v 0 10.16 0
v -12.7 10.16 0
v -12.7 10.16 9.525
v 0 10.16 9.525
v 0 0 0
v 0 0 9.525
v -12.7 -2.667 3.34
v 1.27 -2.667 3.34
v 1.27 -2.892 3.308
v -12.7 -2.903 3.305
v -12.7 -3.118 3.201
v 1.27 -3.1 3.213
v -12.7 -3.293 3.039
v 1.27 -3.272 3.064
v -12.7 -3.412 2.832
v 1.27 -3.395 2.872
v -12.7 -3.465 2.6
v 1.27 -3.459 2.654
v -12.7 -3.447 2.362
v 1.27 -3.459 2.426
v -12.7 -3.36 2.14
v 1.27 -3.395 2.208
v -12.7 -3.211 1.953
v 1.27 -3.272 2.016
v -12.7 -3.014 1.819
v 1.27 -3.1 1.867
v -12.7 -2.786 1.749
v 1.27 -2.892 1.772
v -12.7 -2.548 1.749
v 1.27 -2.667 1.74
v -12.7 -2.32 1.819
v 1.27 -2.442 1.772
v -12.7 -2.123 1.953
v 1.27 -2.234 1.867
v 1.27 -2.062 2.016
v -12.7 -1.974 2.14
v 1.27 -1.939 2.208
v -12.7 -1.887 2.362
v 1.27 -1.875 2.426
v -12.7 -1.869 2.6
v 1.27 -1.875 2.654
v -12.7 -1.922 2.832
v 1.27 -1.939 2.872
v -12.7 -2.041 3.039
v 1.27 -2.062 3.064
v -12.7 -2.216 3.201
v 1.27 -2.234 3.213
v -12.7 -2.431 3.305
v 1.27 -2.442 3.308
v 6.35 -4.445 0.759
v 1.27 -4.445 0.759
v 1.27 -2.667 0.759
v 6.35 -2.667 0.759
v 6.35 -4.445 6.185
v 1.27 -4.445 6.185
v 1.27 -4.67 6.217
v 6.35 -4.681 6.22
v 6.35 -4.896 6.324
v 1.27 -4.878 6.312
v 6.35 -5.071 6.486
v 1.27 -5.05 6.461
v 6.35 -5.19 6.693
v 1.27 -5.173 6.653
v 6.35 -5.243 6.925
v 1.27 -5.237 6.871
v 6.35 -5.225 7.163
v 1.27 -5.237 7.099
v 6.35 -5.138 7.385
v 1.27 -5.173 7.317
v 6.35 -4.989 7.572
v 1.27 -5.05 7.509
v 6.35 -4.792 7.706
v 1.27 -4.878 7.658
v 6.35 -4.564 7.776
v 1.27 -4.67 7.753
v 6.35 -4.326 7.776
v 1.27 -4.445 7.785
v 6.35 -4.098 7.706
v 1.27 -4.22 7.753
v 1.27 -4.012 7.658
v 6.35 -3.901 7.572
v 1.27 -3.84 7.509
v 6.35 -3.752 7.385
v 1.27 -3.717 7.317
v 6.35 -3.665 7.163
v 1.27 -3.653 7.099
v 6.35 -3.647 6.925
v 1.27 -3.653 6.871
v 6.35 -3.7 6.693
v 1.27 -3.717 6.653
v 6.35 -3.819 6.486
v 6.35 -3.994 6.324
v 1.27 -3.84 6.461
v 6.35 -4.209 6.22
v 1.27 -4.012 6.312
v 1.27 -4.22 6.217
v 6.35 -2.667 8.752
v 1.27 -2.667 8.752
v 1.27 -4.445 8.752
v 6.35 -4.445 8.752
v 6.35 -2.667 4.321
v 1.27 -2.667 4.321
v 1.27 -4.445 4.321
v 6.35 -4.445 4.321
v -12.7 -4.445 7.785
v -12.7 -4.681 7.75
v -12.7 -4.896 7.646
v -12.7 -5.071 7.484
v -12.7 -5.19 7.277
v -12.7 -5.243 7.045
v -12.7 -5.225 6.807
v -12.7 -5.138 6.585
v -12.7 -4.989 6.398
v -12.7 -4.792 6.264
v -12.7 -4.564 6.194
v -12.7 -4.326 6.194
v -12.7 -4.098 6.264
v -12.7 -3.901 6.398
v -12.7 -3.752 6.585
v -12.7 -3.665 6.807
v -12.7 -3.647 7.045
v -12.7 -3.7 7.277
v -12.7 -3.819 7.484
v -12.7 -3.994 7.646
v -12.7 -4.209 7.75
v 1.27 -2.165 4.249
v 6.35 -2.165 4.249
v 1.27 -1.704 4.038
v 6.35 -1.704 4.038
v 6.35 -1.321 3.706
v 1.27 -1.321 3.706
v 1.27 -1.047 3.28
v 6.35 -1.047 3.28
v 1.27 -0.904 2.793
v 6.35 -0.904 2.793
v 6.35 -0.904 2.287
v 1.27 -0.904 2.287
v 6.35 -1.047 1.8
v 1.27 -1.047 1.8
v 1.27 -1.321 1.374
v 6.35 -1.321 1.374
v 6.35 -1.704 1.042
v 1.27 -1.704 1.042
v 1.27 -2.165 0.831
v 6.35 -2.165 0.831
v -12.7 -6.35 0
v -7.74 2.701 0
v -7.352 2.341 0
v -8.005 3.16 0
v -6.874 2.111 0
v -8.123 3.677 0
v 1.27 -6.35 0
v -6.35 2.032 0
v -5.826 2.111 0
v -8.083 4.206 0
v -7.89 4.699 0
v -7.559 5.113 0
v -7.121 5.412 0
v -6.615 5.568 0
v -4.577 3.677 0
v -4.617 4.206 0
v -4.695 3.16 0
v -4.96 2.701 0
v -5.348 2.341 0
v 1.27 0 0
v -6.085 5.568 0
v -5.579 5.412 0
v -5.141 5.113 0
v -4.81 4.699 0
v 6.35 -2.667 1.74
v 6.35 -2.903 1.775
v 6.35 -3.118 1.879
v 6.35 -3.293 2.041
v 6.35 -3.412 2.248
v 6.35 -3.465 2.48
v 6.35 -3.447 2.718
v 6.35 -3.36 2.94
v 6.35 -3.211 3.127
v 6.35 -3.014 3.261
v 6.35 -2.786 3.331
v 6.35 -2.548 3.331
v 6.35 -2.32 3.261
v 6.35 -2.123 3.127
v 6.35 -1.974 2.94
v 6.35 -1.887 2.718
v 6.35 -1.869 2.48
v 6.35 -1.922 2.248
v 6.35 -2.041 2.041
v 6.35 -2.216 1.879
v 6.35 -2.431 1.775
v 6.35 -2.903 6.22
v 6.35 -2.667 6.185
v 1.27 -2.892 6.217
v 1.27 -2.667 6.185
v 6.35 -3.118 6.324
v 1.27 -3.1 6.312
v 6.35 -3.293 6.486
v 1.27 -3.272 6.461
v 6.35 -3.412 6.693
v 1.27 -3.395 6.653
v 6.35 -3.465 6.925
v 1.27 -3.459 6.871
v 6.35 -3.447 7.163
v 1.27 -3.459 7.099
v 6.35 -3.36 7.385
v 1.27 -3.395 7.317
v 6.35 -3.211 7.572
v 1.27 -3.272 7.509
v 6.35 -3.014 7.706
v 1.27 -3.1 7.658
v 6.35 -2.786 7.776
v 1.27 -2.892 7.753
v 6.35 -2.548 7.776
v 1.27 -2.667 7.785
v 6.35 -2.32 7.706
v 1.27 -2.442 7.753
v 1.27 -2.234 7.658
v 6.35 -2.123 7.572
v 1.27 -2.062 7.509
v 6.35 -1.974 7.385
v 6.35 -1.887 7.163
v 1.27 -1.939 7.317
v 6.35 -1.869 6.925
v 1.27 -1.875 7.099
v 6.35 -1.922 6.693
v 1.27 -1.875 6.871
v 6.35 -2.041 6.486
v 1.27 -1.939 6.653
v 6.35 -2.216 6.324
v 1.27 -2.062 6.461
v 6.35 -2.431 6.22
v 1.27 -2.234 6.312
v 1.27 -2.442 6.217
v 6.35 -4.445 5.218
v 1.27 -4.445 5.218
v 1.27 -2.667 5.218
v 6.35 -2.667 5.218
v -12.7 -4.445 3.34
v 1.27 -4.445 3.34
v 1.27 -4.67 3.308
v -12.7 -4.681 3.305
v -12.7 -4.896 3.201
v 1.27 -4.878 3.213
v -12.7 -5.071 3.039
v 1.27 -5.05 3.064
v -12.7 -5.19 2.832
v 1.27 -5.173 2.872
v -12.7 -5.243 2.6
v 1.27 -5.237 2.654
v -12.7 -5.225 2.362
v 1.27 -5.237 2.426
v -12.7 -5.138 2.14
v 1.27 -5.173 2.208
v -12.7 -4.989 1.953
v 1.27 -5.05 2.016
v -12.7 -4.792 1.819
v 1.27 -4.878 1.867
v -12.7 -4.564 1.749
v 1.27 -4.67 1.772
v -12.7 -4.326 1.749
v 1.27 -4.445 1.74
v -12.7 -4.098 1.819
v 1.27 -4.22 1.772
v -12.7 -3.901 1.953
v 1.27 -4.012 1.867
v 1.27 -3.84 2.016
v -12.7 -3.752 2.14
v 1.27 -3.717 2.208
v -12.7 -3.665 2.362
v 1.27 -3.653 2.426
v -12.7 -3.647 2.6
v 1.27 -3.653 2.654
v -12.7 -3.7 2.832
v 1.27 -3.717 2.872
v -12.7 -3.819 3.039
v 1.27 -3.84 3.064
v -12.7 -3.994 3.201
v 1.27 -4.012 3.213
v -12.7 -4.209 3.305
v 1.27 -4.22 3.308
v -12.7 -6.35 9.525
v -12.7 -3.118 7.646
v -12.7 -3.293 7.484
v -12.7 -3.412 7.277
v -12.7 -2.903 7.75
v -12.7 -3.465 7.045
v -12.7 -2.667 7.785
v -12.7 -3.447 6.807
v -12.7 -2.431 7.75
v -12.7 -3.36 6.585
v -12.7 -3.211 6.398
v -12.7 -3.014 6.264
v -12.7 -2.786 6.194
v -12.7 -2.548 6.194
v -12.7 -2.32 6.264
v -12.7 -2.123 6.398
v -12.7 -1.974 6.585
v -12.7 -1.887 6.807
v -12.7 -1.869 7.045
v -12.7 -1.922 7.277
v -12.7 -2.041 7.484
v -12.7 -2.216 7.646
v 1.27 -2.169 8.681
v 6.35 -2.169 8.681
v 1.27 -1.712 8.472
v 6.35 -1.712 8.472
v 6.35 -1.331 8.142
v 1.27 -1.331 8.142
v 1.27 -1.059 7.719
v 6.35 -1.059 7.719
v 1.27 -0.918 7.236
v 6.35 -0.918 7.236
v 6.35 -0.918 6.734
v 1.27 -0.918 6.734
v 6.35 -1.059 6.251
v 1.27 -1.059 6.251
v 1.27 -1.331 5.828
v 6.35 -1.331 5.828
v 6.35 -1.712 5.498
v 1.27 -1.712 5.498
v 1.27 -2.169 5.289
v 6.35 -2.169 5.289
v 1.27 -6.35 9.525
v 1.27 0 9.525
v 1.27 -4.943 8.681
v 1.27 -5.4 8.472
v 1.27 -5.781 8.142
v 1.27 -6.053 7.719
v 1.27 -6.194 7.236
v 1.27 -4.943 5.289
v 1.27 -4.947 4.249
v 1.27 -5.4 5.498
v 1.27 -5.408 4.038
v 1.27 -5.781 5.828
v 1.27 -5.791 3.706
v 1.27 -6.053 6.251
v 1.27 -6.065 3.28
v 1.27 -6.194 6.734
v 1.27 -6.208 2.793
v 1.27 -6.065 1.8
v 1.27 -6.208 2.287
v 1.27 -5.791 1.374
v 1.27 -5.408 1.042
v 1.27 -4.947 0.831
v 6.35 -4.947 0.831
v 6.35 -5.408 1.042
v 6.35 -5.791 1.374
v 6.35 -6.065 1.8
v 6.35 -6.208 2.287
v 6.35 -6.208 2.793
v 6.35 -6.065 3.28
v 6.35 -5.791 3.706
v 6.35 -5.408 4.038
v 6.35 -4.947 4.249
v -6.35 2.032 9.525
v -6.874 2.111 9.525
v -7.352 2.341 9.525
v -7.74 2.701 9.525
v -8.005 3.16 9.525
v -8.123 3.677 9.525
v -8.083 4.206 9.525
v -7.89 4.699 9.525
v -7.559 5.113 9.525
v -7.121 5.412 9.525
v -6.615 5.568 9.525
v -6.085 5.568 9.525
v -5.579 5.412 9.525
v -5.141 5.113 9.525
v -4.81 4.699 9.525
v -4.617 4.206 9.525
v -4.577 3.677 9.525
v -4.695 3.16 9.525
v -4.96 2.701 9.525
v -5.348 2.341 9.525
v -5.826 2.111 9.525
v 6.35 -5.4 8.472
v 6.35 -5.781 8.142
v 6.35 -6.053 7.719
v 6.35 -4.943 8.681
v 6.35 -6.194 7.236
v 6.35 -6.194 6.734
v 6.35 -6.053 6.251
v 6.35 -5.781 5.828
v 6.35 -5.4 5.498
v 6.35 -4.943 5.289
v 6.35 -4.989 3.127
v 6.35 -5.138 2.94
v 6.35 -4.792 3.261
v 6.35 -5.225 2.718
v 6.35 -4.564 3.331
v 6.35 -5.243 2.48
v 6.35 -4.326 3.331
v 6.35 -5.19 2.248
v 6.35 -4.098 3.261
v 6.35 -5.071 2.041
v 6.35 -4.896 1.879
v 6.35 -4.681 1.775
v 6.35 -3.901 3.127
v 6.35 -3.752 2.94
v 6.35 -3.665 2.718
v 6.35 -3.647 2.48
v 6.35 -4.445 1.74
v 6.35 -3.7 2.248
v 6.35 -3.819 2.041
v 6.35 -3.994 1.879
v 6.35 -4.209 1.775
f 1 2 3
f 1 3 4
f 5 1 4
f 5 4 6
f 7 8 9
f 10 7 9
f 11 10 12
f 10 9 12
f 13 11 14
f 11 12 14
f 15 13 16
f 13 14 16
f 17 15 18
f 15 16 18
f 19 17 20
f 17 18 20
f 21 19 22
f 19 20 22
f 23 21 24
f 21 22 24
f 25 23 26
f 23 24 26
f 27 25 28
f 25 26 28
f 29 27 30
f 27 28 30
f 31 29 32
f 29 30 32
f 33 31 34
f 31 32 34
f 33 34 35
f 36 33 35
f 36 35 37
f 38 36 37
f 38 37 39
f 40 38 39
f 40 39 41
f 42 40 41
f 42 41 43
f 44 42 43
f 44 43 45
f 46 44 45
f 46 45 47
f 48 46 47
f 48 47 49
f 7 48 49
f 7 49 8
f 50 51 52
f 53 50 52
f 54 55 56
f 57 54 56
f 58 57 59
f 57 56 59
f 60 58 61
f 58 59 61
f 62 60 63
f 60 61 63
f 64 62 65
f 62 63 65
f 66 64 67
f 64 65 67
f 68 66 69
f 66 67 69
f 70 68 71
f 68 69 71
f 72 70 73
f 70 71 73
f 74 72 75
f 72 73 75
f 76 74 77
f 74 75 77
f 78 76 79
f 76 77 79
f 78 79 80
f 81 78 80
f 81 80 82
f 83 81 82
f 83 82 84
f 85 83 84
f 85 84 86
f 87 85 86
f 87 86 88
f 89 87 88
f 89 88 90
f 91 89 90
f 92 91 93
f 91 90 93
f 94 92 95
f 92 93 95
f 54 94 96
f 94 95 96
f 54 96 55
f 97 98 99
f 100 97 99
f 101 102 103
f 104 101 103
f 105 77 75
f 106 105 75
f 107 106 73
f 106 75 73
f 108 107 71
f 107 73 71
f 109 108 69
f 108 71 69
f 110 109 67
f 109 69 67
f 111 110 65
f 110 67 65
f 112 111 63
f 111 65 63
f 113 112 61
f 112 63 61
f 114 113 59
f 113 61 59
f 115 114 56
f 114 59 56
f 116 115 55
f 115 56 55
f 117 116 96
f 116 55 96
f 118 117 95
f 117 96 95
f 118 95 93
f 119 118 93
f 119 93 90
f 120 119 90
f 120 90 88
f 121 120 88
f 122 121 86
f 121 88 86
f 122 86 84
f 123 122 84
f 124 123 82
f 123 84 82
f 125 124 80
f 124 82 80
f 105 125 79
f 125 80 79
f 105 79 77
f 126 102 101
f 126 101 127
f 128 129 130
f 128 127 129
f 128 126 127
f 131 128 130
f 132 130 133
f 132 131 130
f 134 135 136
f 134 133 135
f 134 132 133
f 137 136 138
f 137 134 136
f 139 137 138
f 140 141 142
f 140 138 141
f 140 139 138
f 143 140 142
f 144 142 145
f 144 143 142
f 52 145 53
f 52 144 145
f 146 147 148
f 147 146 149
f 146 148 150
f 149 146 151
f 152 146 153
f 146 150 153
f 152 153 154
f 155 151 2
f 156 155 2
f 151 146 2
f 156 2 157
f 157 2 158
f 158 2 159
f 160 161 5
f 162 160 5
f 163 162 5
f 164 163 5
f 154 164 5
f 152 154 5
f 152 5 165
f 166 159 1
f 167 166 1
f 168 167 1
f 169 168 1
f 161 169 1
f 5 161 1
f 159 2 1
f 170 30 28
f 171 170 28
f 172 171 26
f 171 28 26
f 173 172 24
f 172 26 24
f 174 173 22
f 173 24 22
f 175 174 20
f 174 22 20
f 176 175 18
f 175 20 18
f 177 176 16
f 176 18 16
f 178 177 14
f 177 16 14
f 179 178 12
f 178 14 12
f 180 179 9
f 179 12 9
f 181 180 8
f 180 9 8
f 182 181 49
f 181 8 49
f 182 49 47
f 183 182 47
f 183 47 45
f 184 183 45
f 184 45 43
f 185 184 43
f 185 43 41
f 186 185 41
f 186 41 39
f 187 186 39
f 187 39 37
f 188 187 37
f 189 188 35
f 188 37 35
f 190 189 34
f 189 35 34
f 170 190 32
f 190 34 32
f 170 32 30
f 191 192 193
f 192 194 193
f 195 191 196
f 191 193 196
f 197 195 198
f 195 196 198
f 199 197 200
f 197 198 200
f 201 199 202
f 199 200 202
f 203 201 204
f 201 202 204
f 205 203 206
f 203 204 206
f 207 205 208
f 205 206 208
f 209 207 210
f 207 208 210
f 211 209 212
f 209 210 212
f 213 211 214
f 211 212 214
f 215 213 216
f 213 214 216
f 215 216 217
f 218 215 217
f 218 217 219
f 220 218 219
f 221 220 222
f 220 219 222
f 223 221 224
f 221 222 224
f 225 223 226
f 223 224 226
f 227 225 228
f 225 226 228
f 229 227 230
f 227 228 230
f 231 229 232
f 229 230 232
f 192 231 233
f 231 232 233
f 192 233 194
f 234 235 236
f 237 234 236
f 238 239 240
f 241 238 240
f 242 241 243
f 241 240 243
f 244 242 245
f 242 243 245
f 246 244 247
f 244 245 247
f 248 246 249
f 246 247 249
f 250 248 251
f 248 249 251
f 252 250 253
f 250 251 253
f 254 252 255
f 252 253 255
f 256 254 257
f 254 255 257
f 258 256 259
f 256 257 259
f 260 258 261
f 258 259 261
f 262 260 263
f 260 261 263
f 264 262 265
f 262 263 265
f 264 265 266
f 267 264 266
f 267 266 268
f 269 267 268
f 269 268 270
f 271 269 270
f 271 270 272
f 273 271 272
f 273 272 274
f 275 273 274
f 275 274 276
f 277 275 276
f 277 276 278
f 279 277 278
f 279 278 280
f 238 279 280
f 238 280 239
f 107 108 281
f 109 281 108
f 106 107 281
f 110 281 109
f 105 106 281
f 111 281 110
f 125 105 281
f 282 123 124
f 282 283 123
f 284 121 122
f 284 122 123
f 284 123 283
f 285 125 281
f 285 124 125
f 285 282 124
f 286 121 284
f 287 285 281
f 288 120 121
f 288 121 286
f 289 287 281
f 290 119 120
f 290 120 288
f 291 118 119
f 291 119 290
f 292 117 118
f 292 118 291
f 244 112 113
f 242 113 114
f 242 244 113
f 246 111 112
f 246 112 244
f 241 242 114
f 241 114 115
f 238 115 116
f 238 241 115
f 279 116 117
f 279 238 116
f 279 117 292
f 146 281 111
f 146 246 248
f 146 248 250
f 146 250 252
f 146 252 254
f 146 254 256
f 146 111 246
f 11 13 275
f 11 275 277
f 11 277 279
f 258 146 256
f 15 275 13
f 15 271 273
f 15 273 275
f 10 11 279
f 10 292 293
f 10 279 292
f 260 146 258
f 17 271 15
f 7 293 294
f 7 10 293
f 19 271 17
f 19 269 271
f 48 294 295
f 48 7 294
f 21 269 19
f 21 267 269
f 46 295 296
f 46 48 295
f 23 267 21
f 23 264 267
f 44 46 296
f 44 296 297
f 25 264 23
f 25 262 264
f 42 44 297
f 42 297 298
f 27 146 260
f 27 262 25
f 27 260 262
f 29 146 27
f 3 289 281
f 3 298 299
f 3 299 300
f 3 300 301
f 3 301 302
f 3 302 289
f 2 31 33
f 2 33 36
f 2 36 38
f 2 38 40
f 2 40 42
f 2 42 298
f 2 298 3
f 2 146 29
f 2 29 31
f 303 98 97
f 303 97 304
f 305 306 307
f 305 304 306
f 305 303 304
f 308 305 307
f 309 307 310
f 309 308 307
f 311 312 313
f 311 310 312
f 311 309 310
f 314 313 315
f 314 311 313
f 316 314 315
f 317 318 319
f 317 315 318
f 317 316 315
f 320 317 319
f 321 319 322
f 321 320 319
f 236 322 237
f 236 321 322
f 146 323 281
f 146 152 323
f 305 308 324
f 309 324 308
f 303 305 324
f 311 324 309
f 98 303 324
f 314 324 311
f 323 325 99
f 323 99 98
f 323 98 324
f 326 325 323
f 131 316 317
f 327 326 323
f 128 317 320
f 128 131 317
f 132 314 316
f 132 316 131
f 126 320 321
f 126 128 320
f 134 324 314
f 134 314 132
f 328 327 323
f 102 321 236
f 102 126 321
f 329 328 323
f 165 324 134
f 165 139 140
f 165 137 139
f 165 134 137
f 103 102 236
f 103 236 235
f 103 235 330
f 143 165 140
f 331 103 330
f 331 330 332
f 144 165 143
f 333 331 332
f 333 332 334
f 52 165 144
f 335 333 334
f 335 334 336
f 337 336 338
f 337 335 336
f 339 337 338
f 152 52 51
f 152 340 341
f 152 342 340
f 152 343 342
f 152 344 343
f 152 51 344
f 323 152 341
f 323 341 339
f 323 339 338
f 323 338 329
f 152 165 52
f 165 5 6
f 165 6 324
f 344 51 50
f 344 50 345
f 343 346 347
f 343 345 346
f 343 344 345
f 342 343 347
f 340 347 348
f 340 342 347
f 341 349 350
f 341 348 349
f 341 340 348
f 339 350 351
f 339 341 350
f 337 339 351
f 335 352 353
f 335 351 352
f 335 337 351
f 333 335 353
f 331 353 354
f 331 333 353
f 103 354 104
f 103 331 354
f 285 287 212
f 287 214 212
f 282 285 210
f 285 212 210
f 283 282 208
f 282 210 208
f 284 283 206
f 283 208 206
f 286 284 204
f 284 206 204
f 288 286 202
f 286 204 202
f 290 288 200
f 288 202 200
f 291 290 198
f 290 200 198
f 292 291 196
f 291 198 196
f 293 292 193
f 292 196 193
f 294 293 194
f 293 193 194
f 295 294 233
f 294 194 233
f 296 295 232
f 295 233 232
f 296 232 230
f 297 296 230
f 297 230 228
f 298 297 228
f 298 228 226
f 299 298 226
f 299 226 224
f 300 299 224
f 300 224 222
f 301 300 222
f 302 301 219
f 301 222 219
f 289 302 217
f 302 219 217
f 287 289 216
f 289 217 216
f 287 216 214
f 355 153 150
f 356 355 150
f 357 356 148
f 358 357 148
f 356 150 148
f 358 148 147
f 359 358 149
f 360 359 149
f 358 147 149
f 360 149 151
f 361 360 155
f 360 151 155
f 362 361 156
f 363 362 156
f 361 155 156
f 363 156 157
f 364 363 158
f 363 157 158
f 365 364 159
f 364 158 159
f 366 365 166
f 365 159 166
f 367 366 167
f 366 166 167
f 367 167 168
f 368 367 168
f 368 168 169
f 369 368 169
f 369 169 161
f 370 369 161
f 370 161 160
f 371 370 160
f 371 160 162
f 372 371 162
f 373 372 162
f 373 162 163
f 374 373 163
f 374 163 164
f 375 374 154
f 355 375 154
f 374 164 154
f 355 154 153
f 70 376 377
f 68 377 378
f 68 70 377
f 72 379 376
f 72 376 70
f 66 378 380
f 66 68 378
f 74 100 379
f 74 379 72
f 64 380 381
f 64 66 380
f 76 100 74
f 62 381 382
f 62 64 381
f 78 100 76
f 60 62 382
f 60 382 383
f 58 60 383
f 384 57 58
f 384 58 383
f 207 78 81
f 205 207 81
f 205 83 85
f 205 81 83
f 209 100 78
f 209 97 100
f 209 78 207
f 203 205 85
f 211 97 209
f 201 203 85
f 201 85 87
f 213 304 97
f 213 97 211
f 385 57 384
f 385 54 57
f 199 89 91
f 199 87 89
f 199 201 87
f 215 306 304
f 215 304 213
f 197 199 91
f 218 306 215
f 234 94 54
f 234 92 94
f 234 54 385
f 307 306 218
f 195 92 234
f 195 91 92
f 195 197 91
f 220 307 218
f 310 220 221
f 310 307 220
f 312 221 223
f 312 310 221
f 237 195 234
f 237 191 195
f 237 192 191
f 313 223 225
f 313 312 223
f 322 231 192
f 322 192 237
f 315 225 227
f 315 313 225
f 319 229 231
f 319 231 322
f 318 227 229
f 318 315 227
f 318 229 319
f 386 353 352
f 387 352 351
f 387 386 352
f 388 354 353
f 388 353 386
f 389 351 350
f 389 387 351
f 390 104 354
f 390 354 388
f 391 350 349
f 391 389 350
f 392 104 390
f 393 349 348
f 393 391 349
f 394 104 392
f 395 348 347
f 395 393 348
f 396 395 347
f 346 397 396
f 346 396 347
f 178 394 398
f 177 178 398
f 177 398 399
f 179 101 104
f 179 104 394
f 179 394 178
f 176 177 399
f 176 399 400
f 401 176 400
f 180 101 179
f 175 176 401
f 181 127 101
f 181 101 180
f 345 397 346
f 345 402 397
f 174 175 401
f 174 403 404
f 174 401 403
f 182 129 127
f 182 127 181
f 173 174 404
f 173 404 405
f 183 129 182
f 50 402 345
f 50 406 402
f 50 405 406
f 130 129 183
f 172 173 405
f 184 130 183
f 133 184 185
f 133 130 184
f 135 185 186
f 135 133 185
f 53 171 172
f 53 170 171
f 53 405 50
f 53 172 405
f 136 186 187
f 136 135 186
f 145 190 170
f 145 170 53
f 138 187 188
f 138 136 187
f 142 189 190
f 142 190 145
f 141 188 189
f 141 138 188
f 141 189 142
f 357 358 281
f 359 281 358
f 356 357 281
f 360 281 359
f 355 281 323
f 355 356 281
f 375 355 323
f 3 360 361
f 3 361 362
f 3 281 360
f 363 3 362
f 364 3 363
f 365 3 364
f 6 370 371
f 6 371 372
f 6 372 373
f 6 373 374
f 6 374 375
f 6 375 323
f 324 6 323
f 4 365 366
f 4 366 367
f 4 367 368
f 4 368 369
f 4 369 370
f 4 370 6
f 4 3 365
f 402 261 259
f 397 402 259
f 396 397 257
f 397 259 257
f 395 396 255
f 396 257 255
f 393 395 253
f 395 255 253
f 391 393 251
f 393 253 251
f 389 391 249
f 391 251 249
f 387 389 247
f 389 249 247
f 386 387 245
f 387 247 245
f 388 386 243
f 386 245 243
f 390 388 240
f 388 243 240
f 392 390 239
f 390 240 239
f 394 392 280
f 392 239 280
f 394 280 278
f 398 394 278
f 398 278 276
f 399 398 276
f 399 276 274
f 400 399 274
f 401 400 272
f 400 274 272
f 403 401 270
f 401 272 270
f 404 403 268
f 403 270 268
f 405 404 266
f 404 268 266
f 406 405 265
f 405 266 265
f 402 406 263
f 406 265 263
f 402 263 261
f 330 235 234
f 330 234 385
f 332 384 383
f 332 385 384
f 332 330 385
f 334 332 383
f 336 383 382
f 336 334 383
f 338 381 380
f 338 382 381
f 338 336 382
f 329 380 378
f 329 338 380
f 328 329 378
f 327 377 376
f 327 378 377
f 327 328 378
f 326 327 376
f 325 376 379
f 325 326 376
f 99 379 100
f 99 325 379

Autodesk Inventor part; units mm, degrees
ref_plane "YZ Plane" through (0, 0, 0) normal (1, 0, 0) x (0, 1, 0)
ref_plane "XZ Plane" through (0, 0, 0) normal (0, 1, 0) x (-1, 0, 0)
ref_plane "XY Plane" through (0, 0, 0) normal (0, 0, 1) x (1, 0, 0)
sketch "Sketch1" plane through (0, 0, 0) normal (0, 0, 1) x (1, 0, 0)
  line L0 (-12.7, 10.16) -> (0, 10.16)
  line L1 (0, 10.16) -> (0, 0)
  line L2 (0, 0) -> (1.27, 0)
  line L3 (1.27, 0) -> (1.27, -6.35)
  line L4 (1.27, -6.35) -> (-0.0109, -6.35)
  line L5 (-0.0109, -6.35) -> (-12.7, -6.35)
  line L6 (-12.7, -6.35) -> (-12.7, 10.16)
  dimension "d0" = 12.7
  dimension "d1" = 1.27
  dimension "d2" = 6.35
  dimension "d3" = 16.51
extrude "Extrusion1" add sketch "Sketch1" along normal blind 9.525
hole "Hole1" at (-6.35, 3.81, 9.525) direction (0, 0, -1) diameter 3.556 end through all
hole "Hole2" at (-12.7, -4.445, 2.54) direction (1, 0, 0) diameter 1.6002 end through all
hole "Hole3" at (-12.7, -2.667, 2.54) direction (1, 0, 0) diameter 1.6002 depth 25.4 tip angle 118
hole "Hole4" at (-12.7, -2.667, 6.985) direction (1, 0, 0) diameter 1.6002 end through all
hole "Hole5" at (-12.7, -4.445, 6.985) direction (1, 0, 0) diameter 1.6002 end through all
sketch "Sketch2" plane through (1.27, -6.35, 0) normal (1, 0, 0) x (0, 0, -1)
  circle A0 centre (-6.985, 1.905) radius 0.8001 projected
  circle A1 centre (-6.985, 3.683) radius 0.8001 projected
  circle A2 centre (-2.54, 3.683) radius 0.8001 projected
  circle A3 centre (-2.54, 1.905) radius 0.8001 projected
  arc A4 (-5.2178, 3.683) -> (-8.7522, 3.683) centre (-6.985, 3.683) ccw
  line L0 (-8.7522, 3.683) -> (-8.7522, 1.905)
  arc A5 (-8.7522, 1.905) -> (-5.2178, 1.905) centre (-6.985, 1.905) ccw
  line L1 (-5.2178, 1.905) -> (-5.2178, 3.683)
  line L2 (-4.3207, 3.683) -> (-4.3207, 1.905)
  arc A6 (-4.3207, 1.905) -> (-0.7593, 1.905) centre (-2.54, 1.905) ccw
  line L3 (-0.7593, 1.905) -> (-0.7593, 3.683)
  arc A7 (-0.7593, 3.683) -> (-4.3207, 3.683) centre (-2.54, 3.683) ccw
extrude "Extrusion3" add sketch "Sketch2" along normal blind 5.08
properties part number "lickport_DHO_v0"
